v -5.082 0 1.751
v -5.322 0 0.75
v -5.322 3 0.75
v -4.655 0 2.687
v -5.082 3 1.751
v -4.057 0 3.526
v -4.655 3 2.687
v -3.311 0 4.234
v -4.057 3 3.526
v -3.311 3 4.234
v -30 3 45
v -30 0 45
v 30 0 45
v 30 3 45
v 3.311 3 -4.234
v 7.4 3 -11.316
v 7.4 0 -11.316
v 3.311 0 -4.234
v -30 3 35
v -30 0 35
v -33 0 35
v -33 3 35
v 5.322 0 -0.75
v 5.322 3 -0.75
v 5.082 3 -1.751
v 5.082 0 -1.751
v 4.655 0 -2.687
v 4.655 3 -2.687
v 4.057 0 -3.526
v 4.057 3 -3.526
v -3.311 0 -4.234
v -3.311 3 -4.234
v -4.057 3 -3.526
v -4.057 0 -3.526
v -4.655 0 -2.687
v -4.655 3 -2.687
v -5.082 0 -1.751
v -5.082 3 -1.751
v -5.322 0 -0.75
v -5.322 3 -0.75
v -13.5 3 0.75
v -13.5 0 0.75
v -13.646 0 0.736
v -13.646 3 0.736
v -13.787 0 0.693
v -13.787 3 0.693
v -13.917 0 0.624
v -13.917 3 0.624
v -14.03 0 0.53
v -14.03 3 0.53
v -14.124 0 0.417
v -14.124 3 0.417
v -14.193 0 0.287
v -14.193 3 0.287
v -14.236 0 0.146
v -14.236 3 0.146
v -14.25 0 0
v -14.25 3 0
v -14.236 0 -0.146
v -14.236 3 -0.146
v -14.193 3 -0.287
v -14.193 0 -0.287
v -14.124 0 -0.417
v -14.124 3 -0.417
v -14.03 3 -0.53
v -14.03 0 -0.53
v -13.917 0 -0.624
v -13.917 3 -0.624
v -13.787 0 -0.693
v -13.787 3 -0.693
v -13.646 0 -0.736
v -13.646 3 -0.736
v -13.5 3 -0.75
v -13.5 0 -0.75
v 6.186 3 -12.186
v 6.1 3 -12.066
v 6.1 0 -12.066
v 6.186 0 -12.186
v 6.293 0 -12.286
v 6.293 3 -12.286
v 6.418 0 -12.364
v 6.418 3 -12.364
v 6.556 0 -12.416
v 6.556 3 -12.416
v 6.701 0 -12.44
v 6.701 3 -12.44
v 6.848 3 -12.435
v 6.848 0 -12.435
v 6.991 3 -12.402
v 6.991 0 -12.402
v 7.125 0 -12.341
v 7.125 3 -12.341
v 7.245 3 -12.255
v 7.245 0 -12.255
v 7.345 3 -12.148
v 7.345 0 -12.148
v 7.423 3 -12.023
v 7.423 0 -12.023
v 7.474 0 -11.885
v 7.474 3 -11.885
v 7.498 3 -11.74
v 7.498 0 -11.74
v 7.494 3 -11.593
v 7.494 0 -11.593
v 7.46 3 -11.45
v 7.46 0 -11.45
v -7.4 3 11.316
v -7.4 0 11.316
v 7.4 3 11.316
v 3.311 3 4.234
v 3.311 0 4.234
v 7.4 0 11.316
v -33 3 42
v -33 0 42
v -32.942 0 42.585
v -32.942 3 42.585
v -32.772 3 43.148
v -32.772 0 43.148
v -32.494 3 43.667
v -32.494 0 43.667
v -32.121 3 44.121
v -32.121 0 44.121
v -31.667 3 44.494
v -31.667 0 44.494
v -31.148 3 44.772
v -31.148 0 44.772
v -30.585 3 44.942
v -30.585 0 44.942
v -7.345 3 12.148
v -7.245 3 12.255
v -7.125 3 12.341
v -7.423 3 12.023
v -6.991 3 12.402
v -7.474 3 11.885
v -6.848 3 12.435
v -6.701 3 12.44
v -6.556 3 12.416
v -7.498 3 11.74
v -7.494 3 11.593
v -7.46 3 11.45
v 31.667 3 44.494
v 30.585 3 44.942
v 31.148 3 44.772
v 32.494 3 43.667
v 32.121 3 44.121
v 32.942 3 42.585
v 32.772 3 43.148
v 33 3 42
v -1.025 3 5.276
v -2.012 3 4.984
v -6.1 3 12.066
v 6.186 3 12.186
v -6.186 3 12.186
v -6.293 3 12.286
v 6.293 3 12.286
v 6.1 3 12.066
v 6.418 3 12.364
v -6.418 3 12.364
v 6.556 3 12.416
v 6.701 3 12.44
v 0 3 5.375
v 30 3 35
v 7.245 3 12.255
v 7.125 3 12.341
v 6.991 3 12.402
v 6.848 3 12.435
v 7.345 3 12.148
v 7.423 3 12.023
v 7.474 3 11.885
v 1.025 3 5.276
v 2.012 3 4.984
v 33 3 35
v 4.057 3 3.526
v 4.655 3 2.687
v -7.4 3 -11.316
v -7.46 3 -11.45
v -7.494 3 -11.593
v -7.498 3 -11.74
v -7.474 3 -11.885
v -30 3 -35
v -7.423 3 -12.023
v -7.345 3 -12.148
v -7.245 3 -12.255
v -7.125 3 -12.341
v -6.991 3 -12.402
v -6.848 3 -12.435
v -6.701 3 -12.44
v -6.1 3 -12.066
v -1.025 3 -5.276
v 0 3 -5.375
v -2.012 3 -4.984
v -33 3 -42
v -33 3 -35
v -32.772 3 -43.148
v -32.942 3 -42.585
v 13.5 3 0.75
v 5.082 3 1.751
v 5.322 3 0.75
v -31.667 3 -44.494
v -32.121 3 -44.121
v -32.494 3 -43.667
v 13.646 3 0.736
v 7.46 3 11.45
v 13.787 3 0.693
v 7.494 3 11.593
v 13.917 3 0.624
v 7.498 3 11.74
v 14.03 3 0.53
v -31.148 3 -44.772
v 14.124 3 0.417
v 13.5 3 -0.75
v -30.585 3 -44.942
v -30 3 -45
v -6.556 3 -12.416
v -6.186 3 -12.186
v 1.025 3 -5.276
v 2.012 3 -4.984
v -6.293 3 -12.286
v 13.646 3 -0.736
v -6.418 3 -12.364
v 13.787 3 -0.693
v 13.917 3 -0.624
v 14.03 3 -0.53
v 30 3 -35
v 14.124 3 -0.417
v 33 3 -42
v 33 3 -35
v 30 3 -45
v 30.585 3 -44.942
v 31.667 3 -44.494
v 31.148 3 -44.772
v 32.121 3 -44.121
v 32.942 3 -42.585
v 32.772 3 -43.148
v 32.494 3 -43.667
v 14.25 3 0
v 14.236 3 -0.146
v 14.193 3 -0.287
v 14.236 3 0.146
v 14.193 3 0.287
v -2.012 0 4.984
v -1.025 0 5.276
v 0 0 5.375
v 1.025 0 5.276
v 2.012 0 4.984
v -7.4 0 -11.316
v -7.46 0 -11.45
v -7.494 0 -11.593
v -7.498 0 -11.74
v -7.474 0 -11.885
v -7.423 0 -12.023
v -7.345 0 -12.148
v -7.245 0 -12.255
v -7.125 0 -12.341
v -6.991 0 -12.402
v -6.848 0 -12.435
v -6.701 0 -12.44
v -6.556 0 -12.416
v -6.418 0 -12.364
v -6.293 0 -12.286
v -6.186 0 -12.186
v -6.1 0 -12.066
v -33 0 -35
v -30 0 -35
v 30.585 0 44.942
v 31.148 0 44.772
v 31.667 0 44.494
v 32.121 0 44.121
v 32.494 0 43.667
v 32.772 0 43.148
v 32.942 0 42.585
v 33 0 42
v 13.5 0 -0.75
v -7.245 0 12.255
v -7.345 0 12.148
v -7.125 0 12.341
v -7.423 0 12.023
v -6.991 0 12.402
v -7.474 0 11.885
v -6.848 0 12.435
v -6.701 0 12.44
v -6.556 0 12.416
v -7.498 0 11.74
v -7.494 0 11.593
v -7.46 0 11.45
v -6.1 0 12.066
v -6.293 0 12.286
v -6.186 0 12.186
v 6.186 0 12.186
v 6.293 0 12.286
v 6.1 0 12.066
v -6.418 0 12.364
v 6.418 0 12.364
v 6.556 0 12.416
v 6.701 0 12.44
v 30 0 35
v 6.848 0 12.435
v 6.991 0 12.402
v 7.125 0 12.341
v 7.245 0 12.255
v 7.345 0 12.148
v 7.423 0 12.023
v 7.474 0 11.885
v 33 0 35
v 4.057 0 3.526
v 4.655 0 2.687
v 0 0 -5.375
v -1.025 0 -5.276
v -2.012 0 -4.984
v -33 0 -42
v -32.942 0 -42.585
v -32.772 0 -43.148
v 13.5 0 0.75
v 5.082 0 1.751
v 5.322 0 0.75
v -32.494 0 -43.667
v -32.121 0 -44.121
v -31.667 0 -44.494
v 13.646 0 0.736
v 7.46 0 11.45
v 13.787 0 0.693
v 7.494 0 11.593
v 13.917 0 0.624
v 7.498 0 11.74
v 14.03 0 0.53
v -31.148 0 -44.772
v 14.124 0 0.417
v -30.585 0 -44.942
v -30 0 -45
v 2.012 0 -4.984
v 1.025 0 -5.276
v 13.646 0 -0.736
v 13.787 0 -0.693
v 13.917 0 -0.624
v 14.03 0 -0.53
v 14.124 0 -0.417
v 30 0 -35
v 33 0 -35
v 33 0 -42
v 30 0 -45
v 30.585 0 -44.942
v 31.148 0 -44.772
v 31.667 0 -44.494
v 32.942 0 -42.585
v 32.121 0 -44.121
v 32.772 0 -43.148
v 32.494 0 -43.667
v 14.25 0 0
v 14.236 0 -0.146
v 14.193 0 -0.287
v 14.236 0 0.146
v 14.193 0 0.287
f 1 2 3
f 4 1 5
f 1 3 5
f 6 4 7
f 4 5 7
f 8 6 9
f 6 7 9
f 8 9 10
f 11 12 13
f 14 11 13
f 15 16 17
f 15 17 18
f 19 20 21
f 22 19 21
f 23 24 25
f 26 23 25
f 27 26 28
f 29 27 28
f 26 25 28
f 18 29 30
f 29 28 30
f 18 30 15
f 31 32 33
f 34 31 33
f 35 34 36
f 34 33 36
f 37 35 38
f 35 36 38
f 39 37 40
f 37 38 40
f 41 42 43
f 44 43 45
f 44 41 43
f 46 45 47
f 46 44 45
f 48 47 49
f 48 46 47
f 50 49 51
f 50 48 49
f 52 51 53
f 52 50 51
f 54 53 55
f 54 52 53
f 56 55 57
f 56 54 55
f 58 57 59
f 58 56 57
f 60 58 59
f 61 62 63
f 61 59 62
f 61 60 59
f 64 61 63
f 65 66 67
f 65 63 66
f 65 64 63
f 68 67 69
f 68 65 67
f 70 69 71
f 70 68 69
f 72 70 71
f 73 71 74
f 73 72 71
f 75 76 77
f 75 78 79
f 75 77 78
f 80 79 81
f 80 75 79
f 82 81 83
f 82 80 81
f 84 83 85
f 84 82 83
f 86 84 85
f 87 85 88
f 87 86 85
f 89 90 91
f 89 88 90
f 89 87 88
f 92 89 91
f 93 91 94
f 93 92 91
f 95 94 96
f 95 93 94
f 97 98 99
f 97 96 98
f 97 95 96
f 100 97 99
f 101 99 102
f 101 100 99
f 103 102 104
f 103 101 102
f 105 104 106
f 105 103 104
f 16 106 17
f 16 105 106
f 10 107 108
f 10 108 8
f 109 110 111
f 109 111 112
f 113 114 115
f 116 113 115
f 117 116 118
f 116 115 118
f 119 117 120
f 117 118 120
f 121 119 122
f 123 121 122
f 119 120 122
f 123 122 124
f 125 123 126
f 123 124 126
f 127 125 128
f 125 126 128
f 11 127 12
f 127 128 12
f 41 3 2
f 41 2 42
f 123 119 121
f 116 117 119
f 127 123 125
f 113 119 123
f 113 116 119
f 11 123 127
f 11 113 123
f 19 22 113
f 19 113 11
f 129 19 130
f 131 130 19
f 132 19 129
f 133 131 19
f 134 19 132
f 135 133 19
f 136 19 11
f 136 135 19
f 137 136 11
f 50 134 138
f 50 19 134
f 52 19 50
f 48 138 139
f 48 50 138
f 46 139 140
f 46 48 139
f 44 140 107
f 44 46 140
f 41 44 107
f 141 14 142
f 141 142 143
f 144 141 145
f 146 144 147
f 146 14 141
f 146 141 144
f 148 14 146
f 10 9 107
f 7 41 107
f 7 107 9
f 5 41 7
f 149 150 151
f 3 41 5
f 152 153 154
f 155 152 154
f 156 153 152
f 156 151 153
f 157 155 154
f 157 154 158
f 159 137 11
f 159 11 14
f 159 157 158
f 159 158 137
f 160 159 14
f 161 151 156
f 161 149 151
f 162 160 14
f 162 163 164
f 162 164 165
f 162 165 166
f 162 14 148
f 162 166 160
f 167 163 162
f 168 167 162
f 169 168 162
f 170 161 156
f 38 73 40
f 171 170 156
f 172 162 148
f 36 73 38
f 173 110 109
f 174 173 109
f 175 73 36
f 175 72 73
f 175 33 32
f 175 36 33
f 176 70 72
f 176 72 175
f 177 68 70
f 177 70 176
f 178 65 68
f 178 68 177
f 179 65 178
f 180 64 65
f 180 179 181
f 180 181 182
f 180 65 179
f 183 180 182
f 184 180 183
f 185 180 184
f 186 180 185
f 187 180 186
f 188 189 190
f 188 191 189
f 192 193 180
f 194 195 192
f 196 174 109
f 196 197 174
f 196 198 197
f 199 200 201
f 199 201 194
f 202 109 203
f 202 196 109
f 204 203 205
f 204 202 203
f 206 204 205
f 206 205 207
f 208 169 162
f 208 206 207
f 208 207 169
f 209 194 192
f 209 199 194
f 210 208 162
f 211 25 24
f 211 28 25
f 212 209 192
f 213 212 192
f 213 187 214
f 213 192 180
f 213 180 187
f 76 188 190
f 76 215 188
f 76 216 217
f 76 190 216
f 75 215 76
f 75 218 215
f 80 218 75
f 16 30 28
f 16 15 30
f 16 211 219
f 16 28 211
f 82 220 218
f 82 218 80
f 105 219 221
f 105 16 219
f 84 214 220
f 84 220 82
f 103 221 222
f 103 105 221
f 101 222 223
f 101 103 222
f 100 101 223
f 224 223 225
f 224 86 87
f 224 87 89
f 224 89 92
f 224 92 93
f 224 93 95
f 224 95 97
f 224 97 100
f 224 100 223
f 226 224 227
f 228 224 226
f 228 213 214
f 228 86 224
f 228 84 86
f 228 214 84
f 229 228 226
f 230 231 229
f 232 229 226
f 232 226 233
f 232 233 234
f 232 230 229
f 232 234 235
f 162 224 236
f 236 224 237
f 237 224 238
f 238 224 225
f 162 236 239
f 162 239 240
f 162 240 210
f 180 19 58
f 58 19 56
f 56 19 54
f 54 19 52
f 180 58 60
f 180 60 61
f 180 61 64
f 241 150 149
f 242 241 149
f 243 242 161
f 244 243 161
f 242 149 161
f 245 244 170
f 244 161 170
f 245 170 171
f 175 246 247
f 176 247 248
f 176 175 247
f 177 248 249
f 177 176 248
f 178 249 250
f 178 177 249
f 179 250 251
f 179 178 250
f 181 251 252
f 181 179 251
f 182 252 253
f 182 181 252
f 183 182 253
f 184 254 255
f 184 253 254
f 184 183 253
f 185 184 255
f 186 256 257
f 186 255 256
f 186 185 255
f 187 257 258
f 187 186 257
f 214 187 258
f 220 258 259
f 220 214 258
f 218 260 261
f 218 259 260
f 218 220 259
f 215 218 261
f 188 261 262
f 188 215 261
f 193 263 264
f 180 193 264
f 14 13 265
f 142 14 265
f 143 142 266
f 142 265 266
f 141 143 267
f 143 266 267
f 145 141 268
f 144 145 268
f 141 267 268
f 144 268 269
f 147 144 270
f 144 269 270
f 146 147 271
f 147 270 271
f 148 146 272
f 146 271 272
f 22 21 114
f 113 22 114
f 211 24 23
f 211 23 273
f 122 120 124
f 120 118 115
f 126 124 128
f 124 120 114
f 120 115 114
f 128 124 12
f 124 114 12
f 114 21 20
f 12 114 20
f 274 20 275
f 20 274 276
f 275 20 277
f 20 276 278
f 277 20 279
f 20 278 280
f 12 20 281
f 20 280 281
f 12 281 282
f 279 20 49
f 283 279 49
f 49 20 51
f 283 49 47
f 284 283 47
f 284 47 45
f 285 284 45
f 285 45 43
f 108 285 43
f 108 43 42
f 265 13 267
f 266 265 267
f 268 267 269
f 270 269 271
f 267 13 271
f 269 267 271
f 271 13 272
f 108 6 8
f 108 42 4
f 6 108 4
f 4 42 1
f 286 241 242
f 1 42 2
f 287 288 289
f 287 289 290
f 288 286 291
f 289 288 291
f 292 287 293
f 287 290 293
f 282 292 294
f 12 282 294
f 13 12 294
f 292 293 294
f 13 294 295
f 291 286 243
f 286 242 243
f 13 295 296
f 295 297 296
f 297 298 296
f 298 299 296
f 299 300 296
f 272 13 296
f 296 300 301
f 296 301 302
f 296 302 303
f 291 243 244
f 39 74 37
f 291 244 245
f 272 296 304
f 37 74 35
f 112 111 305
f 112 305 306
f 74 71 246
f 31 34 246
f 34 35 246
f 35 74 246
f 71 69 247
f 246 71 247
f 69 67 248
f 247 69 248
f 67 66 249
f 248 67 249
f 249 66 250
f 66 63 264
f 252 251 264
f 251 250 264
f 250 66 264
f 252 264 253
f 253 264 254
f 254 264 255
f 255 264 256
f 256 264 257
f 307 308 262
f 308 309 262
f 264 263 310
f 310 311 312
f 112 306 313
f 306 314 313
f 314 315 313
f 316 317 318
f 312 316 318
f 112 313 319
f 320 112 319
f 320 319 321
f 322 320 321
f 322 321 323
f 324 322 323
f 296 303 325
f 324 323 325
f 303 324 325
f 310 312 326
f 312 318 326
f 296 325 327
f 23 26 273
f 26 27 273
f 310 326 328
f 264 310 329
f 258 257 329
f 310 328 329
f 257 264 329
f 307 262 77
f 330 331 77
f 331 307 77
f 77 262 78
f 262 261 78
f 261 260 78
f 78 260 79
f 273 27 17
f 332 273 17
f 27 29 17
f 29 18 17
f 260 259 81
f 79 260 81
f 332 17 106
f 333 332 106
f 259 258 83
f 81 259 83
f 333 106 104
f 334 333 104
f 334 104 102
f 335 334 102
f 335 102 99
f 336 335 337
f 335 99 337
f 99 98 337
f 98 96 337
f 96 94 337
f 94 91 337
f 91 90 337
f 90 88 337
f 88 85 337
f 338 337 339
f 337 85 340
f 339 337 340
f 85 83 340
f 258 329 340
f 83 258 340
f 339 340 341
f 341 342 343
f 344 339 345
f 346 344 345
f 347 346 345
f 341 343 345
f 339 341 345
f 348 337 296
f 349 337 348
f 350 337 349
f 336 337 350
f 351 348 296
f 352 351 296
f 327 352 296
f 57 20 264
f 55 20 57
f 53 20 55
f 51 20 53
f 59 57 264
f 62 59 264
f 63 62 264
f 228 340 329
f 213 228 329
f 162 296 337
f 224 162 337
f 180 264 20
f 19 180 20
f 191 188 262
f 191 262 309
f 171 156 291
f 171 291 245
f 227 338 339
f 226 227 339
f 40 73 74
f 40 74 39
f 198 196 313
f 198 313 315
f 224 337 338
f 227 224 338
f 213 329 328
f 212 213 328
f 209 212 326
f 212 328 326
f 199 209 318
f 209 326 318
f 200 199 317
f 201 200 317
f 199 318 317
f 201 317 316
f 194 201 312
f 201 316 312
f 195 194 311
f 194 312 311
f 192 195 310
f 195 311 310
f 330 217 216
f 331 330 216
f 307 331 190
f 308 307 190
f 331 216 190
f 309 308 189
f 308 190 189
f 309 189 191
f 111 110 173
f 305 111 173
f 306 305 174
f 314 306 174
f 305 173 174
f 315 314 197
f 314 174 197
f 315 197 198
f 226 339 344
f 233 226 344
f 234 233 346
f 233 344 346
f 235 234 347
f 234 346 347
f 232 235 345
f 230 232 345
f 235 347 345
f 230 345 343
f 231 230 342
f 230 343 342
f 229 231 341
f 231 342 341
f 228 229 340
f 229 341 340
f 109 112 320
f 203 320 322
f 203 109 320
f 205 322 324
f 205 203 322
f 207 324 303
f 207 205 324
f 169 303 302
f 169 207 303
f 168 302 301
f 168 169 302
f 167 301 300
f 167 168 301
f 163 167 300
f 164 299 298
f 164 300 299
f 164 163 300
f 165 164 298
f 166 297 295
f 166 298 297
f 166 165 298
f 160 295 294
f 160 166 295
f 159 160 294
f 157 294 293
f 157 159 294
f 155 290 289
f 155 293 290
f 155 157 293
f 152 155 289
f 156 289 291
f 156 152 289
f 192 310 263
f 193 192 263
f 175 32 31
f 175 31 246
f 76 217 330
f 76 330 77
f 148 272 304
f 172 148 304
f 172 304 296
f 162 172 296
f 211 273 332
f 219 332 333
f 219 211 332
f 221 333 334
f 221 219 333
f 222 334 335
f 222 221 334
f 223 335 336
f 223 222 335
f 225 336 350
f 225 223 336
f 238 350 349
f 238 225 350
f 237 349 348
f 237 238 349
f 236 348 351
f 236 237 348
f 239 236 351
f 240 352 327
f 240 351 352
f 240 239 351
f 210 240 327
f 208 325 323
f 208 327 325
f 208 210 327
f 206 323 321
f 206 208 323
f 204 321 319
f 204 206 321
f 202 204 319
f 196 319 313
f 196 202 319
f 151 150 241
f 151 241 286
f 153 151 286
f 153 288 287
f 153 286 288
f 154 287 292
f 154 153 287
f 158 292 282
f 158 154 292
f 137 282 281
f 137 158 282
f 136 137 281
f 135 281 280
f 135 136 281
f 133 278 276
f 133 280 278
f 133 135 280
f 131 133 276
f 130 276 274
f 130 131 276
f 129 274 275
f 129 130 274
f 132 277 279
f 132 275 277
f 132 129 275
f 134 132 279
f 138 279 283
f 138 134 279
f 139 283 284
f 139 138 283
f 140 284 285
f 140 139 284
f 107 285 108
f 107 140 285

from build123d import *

# Parameters (mm, degrees)
BOSS_EXTRUDE1_DEPTH = 3
SKETCH2_R           = 2.69
CUT_EXTRUDE1_DEPTH  = 10
SKETCH3_R           = 5.375
CUT_EXTRUDE2_DEPTH  = 10


with BuildPart() as part:
    # Sketch1 → Boss-Extrude1 (new body)
    with BuildSketch(Plane(origin=(0, 0, 0), x_dir=(1, 0, 0), z_dir=(0, 1, 0))):
        with BuildLine():
            ThreePointArc((-33, -42), (-32.121320344, -44.121320344), (-30, -45))
            Line((-30, -45), (30, -45))
            ThreePointArc((30, -45), (32.121320344, -44.121320344), (33, -42))
            Line((33, -42), (33, -35))
            Line((33, -35), (30, -35))
            Line((30, -35), (30, 35))
            Line((30, 35), (33, 35))
            Line((33, 35), (33, 42))
            ThreePointArc((33, 42), (32.121320344, 44.121320344), (30, 45))
            Line((30, 45), (-30, 45))
            ThreePointArc((-30, 45), (-32.121320344, 44.121320344), (-33, 42))
            Line((-33, 42), (-33, 35))
            Line((-33, 35), (-30, 35))
            Line((-30, 35), (-30, -35))
            Line((-30, -35), (-33, -35))
            Line((-33, -35), (-33, -42))
        make_face()
    extrude(amount=BOSS_EXTRUDE1_DEPTH)

    # Sketch2 → Cut-Extrude1 (cut)
    with BuildSketch(Plane(origin=(0, 3, 0), x_dir=(1, 0, 0), z_dir=(0, 1, 0))):
        Circle(SKETCH2_R)
        with BuildLine():
            Line((-13.5, 0.75), (13.5, 0.75))
            ThreePointArc((13.5, 0.75), (14.25, 0), (13.5, -0.75))
            Line((13.5, -0.75), (-13.5, -0.75))
            ThreePointArc((-13.5, -0.75), (-14.25, 0), (-13.5, 0.75))
        make_face()
        with BuildLine():
            Line((-7.399519053, -11.316342951), (6.100480947, 12.066342951))
            ThreePointArc((6.100480947, 12.066342951), (7.125, 12.340862004), (7.399519053, 11.316342951))
            Line((7.399519053, 11.316342951), (-6.100480947, -12.066342951))
            ThreePointArc((-6.100480947, -12.066342951), (-7.125, -12.340862004), (-7.399519053, -11.316342951))
        make_face()
        with BuildLine():
            Line((6.100480947, -12.066342951), (-7.399519053, 11.316342951))
            ThreePointArc((-7.399519053, 11.316342951), (-7.125, 12.340862004), (-6.100480947, 12.066342951))
            Line((-6.100480947, 12.066342951), (7.399519053, -11.316342951))
            ThreePointArc((7.399519053, -11.316342951), (7.125, -12.340862004), (6.100480947, -12.066342951))
        make_face()
    extrude(amount=-CUT_EXTRUDE1_DEPTH, mode=Mode.SUBTRACT)

    # Sketch3 → Cut-Extrude2 (cut)
    with BuildSketch(Plane(origin=(0, 3, 0), x_dir=(1, 0, 0), z_dir=(0, 1, 0))):
        Circle(SKETCH3_R)
    extrude(amount=-CUT_EXTRUDE2_DEPTH, mode=Mode.SUBTRACT)


solid = part.part
